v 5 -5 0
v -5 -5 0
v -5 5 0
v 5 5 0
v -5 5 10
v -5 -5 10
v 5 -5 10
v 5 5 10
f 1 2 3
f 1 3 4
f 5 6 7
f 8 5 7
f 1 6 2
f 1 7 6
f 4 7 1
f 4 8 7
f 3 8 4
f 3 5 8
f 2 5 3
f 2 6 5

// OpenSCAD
// model21: 2D primitives (square, circle) with linear_extrude
linear_extrude(height = 10) {
    square(10, center = true);
}
